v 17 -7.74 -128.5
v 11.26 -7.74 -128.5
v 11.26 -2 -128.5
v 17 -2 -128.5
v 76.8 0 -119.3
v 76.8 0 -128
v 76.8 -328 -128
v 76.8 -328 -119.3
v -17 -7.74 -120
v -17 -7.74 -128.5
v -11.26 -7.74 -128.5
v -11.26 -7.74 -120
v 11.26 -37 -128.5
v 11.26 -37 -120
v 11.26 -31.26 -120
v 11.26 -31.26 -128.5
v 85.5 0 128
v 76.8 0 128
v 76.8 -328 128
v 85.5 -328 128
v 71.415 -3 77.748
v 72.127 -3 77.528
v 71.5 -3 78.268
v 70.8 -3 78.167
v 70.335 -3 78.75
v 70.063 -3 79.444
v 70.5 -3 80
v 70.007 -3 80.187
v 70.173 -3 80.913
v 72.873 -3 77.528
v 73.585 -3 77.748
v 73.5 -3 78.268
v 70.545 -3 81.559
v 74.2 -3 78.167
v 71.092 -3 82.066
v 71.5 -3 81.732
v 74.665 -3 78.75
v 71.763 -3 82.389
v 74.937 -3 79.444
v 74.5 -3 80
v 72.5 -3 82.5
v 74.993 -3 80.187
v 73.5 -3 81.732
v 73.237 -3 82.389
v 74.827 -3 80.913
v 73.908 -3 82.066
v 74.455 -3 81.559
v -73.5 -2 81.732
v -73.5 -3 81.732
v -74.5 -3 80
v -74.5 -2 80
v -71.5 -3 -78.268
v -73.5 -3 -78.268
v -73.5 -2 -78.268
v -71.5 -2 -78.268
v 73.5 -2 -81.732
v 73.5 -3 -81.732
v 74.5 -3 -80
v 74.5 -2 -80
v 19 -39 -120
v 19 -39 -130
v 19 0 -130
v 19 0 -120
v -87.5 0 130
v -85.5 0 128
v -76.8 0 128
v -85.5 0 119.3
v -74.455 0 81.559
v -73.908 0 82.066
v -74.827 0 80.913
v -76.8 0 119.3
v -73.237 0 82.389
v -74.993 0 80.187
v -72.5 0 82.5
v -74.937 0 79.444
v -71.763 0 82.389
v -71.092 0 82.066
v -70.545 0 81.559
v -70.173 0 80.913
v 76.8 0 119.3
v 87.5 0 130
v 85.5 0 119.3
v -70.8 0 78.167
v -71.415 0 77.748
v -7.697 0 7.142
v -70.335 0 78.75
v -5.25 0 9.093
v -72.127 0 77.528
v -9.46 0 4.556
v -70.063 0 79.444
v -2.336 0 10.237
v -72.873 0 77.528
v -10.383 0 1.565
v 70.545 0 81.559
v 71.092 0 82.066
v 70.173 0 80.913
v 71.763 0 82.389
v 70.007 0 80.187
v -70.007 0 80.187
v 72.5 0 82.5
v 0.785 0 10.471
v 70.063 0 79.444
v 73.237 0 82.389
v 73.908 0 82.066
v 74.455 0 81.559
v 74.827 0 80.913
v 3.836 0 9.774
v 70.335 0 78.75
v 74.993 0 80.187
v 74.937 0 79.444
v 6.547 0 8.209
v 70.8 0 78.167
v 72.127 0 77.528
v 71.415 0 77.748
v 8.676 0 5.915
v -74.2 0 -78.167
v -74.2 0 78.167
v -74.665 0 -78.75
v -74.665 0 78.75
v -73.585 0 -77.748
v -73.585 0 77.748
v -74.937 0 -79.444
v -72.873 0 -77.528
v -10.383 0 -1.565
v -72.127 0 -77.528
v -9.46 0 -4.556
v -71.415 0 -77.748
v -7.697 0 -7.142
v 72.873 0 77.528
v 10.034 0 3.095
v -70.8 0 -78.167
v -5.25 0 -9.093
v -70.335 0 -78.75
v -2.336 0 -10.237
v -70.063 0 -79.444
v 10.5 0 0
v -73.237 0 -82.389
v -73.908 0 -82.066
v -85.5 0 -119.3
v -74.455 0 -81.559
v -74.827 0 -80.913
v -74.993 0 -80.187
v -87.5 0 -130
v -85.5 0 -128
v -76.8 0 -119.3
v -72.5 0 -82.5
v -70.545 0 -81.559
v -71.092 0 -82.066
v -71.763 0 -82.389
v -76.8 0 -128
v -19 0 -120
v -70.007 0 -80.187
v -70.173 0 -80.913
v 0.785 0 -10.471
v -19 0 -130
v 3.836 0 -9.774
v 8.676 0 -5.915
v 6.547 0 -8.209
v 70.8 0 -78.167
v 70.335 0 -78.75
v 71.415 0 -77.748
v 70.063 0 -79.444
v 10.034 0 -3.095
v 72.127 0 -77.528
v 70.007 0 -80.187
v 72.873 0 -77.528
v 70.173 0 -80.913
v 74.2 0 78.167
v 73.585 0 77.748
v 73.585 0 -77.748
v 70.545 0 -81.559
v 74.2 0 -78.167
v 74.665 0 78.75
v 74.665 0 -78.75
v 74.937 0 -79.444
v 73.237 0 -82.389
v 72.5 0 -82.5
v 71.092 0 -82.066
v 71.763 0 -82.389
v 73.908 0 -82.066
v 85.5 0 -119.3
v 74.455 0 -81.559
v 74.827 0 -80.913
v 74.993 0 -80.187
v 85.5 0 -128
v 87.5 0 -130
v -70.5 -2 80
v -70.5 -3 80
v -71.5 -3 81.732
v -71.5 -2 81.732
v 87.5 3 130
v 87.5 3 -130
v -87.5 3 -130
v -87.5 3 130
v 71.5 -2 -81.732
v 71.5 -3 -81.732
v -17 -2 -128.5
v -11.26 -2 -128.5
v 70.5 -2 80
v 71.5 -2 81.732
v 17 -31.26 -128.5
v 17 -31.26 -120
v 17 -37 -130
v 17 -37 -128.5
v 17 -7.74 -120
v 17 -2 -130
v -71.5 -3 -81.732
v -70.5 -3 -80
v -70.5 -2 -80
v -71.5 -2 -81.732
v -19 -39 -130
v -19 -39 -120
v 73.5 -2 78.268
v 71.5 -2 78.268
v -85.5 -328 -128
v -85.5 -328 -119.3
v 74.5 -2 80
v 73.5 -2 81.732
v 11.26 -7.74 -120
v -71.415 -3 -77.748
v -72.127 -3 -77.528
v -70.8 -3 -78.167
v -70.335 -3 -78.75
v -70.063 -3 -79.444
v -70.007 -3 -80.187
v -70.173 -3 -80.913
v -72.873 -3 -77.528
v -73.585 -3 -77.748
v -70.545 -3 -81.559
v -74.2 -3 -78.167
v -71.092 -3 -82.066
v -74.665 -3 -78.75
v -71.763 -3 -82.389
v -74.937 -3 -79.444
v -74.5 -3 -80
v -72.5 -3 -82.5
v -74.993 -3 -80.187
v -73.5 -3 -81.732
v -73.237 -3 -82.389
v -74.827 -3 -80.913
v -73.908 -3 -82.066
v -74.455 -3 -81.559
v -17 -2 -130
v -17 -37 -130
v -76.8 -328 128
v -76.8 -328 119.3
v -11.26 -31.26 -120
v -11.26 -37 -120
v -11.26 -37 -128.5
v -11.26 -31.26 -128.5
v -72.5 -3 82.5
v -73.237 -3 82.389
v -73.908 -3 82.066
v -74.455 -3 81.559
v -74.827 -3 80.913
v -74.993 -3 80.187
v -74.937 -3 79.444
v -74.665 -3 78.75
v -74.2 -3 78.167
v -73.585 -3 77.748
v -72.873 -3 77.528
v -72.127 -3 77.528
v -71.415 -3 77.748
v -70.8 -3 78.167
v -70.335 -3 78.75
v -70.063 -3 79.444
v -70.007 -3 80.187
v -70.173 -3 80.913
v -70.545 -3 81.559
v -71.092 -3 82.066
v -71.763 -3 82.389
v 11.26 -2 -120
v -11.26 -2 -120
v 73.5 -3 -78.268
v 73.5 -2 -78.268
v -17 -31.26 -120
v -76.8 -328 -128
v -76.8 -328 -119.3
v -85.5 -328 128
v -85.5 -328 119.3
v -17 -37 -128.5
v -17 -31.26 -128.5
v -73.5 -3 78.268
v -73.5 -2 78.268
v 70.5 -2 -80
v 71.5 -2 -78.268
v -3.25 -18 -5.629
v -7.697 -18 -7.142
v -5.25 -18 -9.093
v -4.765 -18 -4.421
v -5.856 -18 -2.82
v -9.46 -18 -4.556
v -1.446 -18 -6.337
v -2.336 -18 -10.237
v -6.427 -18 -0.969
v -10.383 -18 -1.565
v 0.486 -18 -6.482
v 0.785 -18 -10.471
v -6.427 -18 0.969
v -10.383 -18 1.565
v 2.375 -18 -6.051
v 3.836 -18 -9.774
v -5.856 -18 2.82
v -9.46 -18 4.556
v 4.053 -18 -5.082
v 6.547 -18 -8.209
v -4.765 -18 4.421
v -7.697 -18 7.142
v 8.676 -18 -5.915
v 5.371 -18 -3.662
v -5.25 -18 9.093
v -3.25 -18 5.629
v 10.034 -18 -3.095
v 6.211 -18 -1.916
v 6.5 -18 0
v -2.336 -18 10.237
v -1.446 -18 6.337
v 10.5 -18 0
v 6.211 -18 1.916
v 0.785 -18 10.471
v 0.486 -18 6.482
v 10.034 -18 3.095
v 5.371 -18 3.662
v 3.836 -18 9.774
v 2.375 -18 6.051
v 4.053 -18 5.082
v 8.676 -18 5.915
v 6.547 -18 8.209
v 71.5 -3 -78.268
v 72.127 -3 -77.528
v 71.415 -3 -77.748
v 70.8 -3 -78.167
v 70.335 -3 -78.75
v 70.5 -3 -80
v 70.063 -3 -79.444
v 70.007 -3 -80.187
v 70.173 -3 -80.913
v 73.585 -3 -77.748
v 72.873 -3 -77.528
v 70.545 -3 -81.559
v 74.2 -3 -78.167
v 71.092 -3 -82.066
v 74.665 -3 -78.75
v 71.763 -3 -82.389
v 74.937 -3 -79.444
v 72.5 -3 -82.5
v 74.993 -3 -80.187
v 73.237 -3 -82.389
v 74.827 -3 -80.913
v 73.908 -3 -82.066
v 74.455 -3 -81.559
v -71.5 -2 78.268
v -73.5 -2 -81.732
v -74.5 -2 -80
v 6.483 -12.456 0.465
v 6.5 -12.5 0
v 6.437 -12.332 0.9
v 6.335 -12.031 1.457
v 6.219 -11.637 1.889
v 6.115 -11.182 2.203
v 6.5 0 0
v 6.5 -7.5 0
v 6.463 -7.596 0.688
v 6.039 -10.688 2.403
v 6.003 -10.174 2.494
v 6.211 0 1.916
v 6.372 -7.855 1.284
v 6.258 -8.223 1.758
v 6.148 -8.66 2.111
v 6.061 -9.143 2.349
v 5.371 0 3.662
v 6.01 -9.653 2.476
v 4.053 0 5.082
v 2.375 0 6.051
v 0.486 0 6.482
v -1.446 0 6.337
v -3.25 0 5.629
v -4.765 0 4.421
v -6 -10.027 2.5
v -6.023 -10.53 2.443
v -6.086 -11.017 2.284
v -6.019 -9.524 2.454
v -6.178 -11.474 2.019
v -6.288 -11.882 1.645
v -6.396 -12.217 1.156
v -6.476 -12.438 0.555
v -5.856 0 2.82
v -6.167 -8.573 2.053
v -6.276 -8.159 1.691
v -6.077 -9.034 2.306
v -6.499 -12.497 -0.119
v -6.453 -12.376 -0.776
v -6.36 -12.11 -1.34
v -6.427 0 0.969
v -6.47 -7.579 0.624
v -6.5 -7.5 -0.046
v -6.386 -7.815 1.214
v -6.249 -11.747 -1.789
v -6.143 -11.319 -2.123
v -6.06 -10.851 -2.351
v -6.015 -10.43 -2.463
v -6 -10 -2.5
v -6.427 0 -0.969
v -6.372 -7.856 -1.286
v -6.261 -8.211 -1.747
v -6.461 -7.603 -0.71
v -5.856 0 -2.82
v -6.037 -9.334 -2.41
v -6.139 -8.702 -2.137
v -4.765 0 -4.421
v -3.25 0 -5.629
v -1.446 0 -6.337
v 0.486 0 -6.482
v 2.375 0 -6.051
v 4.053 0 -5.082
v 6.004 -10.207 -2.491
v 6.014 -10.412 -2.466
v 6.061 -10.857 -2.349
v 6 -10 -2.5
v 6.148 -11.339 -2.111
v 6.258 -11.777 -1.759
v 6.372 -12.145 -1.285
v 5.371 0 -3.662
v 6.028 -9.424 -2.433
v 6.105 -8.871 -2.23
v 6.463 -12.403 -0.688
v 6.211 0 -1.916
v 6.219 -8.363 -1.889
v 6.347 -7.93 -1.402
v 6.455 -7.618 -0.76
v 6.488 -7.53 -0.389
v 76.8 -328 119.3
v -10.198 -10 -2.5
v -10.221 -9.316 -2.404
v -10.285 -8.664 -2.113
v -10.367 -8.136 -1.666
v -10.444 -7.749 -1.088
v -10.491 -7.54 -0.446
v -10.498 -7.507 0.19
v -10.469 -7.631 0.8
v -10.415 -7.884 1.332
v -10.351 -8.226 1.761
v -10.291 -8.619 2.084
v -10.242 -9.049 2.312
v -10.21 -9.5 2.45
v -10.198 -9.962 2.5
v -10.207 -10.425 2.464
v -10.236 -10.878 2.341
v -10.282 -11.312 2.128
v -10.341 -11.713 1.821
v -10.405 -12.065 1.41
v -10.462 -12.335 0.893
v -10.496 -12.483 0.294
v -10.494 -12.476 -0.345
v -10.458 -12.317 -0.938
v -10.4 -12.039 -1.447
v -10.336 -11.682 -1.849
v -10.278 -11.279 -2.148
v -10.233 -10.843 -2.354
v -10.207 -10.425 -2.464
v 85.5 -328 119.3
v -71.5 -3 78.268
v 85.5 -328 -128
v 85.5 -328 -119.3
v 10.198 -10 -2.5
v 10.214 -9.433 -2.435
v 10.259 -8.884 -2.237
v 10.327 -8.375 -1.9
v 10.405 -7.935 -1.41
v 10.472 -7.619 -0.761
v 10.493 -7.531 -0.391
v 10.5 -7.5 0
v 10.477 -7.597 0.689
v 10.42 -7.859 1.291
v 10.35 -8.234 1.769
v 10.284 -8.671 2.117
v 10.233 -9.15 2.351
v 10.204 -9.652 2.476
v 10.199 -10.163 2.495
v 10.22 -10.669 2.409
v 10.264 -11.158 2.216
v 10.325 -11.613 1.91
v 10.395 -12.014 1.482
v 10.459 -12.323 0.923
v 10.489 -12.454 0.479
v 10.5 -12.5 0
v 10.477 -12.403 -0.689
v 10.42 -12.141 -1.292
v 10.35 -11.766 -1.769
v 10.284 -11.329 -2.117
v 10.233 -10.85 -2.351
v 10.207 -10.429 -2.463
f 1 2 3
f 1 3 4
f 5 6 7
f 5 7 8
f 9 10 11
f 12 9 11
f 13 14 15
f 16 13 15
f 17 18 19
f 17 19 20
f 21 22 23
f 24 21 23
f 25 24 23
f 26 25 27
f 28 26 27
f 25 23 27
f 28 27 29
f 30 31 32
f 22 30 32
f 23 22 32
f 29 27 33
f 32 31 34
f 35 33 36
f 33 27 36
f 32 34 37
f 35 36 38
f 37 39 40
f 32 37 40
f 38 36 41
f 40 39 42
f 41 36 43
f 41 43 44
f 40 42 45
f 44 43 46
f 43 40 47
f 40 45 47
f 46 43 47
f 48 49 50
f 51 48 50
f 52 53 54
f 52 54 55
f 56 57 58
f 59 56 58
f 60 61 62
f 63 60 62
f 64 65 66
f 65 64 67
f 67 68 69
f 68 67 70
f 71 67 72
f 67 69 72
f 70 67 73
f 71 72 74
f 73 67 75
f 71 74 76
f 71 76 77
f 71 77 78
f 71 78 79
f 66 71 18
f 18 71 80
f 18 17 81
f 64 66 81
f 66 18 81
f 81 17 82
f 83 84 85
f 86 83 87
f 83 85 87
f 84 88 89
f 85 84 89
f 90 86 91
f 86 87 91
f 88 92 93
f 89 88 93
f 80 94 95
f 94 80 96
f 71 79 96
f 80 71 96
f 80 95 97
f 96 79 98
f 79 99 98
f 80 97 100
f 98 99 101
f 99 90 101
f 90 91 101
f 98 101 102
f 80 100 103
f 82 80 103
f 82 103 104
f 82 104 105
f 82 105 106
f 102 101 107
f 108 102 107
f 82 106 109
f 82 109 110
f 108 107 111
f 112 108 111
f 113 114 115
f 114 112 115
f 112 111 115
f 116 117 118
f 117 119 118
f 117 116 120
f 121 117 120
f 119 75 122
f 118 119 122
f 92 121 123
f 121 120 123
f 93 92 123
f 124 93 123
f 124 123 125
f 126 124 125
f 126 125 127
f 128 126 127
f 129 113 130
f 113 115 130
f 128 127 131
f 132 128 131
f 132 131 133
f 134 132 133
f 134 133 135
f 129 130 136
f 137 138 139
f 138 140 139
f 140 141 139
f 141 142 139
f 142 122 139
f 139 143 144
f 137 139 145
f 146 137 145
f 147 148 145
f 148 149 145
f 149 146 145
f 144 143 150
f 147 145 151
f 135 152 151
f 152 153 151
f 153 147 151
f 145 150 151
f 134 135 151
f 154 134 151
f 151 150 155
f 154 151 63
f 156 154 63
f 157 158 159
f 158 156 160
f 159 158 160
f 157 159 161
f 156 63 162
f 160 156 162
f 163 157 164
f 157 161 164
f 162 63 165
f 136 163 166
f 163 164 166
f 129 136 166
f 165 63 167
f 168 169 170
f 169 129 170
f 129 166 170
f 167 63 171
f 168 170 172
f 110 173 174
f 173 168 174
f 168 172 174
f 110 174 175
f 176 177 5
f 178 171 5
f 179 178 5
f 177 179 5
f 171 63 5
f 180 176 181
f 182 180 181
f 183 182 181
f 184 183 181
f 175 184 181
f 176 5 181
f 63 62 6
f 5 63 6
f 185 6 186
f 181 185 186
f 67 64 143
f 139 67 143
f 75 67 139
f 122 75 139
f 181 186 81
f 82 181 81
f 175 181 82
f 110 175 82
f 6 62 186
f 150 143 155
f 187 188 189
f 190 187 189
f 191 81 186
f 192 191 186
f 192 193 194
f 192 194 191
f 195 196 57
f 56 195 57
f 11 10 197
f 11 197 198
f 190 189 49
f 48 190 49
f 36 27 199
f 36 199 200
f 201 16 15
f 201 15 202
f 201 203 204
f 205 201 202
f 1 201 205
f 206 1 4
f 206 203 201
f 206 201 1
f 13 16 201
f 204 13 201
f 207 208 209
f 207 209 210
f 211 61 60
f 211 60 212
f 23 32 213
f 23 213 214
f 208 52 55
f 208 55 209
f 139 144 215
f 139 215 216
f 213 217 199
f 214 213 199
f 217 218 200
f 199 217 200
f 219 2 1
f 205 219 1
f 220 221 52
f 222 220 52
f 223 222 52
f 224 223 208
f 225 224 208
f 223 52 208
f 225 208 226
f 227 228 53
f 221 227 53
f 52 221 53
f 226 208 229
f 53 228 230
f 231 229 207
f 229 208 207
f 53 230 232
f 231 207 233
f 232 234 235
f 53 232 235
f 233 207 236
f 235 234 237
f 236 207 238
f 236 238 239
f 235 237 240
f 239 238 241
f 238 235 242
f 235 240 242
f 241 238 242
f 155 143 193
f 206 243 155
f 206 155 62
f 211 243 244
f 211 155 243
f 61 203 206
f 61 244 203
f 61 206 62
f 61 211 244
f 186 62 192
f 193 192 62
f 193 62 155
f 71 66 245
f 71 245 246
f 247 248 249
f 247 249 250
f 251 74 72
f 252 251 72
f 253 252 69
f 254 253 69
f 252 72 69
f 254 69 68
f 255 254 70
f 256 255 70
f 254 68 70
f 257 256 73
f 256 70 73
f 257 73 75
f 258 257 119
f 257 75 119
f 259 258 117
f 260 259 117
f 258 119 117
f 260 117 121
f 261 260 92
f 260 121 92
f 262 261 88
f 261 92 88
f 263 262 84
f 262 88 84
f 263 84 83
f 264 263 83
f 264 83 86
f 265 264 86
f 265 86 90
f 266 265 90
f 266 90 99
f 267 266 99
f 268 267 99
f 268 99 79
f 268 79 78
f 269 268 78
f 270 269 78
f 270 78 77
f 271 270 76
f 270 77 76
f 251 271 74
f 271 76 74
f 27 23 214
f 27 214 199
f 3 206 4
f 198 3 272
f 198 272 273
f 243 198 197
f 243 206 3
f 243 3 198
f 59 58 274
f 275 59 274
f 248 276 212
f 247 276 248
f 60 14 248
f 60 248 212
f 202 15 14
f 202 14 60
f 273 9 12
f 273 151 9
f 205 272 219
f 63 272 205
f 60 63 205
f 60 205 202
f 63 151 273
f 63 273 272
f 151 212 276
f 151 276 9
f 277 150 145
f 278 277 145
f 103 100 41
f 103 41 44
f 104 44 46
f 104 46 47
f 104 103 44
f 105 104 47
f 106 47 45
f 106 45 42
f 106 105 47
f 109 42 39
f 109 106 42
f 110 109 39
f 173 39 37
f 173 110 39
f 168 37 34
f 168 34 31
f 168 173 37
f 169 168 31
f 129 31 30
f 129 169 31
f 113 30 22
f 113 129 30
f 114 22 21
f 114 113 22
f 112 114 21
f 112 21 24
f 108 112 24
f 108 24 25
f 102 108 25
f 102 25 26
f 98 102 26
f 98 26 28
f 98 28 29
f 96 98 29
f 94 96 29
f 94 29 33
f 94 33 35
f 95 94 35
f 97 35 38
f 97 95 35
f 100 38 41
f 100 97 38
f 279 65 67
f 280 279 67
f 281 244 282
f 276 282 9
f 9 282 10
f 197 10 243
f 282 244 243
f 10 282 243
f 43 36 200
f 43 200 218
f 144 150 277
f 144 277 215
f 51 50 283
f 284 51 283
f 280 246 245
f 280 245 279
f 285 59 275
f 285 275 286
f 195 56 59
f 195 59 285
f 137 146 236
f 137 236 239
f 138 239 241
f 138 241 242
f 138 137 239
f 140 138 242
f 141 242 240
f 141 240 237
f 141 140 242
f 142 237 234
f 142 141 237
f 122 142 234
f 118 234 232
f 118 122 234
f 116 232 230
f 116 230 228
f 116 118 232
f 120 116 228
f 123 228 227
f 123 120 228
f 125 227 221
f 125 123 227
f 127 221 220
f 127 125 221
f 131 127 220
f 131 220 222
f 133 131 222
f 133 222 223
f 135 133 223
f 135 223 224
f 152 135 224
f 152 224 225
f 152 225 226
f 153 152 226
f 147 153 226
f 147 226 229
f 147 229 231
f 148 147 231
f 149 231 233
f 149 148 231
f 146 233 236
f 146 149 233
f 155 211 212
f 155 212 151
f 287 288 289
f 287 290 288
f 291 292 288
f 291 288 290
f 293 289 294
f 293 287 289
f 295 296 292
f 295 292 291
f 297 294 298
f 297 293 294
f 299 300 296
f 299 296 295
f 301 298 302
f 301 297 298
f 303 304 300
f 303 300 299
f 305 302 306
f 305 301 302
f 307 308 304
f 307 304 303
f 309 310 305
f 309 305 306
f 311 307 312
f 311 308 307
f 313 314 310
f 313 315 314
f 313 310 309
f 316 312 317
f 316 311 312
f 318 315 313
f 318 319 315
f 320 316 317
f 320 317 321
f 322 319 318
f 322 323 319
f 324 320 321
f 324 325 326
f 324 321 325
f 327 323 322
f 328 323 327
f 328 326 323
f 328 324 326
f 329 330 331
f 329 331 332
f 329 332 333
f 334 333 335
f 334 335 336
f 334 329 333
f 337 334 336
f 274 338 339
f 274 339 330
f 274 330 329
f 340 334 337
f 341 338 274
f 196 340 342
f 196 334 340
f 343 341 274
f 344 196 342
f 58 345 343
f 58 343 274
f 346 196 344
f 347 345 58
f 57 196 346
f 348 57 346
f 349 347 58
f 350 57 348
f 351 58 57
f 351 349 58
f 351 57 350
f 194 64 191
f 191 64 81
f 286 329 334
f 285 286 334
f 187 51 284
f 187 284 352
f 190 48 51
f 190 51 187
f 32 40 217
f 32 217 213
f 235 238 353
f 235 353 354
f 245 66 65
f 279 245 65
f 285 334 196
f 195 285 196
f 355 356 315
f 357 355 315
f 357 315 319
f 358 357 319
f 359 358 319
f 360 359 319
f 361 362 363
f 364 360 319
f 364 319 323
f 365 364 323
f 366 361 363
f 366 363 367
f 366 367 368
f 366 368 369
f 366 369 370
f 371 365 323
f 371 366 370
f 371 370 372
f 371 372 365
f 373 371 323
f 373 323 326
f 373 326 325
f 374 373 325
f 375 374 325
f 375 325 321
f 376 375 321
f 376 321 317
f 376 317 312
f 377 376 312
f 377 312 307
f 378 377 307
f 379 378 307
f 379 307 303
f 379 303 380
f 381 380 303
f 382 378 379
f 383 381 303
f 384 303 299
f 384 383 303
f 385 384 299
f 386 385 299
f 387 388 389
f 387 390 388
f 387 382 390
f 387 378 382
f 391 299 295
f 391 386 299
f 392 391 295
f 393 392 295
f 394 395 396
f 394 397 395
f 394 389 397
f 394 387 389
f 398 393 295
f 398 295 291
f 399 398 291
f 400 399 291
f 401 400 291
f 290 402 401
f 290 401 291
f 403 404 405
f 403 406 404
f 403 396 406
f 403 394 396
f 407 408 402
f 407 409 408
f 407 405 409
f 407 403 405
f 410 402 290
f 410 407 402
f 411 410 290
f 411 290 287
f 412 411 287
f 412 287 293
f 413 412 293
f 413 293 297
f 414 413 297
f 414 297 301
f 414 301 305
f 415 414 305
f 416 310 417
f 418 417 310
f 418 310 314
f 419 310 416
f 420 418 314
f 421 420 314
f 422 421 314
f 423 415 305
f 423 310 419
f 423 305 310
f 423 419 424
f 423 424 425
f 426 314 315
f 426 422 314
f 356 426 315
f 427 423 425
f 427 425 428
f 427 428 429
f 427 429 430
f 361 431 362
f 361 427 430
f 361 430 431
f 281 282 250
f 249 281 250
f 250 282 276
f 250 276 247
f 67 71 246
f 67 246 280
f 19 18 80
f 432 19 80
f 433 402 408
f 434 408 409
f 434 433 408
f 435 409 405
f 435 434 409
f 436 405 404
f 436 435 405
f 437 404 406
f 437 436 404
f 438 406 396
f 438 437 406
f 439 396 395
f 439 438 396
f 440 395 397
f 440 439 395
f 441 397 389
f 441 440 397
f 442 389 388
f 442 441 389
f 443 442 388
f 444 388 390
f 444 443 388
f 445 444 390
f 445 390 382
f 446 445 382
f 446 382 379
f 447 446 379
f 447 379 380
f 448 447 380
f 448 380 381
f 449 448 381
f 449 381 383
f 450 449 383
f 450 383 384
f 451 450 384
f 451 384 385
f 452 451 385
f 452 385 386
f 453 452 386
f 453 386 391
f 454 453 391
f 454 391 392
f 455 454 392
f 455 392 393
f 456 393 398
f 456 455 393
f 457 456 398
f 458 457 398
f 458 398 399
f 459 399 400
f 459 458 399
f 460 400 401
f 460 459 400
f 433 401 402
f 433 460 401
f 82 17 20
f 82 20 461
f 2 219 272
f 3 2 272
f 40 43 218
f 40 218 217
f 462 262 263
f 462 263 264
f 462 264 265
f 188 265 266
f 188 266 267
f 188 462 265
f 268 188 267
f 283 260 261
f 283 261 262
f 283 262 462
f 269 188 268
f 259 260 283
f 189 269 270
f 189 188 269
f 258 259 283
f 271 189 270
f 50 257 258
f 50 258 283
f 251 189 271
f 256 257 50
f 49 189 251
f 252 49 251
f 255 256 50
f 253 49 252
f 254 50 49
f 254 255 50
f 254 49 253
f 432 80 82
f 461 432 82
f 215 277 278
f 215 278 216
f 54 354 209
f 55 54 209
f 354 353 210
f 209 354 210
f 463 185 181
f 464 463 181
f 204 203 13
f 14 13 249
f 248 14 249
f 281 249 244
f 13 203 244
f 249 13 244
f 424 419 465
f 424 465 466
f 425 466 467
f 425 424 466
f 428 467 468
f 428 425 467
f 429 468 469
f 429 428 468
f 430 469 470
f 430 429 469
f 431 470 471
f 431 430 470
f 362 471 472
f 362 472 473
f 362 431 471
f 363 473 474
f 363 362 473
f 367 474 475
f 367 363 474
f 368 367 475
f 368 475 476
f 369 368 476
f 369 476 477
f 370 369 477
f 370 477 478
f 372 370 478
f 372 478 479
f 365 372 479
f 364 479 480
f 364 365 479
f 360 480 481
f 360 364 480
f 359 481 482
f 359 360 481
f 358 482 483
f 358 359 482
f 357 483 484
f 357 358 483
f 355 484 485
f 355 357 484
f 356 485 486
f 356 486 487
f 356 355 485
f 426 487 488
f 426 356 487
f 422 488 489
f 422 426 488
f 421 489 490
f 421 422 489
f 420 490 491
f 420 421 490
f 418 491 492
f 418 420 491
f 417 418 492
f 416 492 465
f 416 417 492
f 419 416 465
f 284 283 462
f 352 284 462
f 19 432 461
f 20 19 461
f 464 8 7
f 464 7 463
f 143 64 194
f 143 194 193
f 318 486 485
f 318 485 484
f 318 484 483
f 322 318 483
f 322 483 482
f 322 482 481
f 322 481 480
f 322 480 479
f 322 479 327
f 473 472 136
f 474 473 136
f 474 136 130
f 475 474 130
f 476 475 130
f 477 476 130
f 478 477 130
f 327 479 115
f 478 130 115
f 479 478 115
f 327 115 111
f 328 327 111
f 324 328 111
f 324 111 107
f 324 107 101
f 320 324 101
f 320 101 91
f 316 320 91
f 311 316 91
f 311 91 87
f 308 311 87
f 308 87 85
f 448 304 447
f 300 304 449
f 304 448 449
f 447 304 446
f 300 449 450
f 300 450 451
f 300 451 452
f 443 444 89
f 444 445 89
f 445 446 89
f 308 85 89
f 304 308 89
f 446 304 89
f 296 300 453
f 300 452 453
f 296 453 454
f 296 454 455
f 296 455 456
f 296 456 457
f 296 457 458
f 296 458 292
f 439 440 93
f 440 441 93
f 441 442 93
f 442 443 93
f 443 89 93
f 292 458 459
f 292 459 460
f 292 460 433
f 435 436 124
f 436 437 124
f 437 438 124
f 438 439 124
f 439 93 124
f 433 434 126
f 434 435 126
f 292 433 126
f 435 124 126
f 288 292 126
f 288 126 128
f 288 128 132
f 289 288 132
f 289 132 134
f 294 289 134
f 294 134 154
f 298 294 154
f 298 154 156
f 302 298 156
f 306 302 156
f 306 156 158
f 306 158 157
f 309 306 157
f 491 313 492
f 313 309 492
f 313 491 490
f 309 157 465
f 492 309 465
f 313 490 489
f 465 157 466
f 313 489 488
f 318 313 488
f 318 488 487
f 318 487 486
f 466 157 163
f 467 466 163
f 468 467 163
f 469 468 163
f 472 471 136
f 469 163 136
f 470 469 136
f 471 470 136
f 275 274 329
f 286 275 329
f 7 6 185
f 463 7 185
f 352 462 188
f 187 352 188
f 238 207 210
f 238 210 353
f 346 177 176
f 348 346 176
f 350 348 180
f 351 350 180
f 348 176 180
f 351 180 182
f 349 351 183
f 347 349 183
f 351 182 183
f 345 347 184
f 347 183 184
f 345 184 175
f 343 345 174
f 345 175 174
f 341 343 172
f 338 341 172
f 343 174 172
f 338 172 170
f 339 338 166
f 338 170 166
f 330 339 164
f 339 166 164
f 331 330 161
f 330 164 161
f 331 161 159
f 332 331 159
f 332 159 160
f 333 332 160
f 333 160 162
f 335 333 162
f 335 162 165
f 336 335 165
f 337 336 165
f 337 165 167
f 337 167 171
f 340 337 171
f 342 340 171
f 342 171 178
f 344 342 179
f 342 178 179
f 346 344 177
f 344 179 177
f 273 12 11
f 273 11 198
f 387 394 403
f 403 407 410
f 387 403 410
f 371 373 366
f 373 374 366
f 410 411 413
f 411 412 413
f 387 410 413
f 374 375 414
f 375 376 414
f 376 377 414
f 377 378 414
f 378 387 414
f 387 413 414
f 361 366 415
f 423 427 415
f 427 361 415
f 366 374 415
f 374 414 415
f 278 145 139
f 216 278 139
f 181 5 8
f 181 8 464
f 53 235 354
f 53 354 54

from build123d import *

# Parameters (mm, degrees)
SKETCH1_W               = 175
SKETCH1_H               = 260
BOSS_EXTRUDE1_DEPTH     = 3
SKETCH4_W               = 8.7
SKETCH4_H               = 8.7
BOSS_EXTRUDE3_DEPTH     = 328
MIRROR5_COPY_1_SKETCH_W = 8.7
MIRROR5_COPY_1_SKETCH_H = 8.7
MIRROR5_COPY_1_DEPTH    = 328
SKETCH6_W               = 38
SKETCH6_H               = 39
SKETCH6_W_2             = 34
SKETCH6_H_2             = 35
EXTRUDE_THIN1_DEPTH     = 10
SKETCH7_W               = 5.74
SKETCH7_H               = 5.74
BOSS_EXTRUDE5_DEPTH     = 8.5
SKETCH9_R               = 10.5
SKETCH9_R_2             = 6.5
EXTRUDE_THIN2_DEPTH     = 18
CUT_EXTRUDE1_DEPTH      = 367.180283467
CUT_EXTRUDE1_DEPTH_BACK = 367.180283467
SKETCH10_R              = 2.5
SKETCH11_R              = 2.5
BOSS_EXTRUDE6_DEPTH     = 3
CUT_EXTRUDE2_DEPTH      = 1
MIRROR7_COPY_1_SKETCH_R = 2.5
MIRROR7_COPY_1_DEPTH    = 3
MIRROR7_COPY_2_DEPTH    = 1


with BuildPart() as part:
    # Sketch1 → Boss-Extrude1 (new body)
    with BuildSketch(Plane(origin=(0, 0, 0), x_dir=(1, 0, 0), z_dir=(0, 1, 0))):
        Rectangle(SKETCH1_W, SKETCH1_H)
    extrude(amount=BOSS_EXTRUDE1_DEPTH)

    # Sketch4 → Boss-Extrude3 (add)
    with BuildSketch(Plane.XZ):
        with Locations((81.15, -123.65)):
            Rectangle(SKETCH4_W, SKETCH4_H)
    boss_extrude3 = extrude(amount=BOSS_EXTRUDE3_DEPTH)

    # Mirror3: Boss-Extrude3 across plane
    add(boss_extrude3.mirror(Plane.XY))

    # Mirror5: Boss-Extrude3 across plane
    add(boss_extrude3.mirror(Plane(origin=(0, 0, 0), x_dir=(0, 0, 1), z_dir=(1, 0, 0))))

    # Mirror5 copy 1 sketch → Mirror5 copy 1 (add)
    with BuildSketch(Plane(origin=(0, 0, 0), x_dir=(-1, 0, 0), z_dir=(0, -1, 0))):
        with Locations((81.15, -123.65)):
            Rectangle(MIRROR5_COPY_1_SKETCH_W, MIRROR5_COPY_1_SKETCH_H)
    extrude(amount=MIRROR5_COPY_1_DEPTH)

    # Sketch6 → Extrude-Thin1 (add)
    with BuildSketch(Plane(origin=(0, 0, -130), x_dir=(-1, 0, 0), z_dir=(0, 0, -1))):
        with Locations((0, -19.5)):
            Rectangle(SKETCH6_W, SKETCH6_H)
        with Locations((0, -19.5)):
            Rectangle(SKETCH6_W_2, SKETCH6_H_2, mode=Mode.SUBTRACT)
    extrude(amount=-EXTRUDE_THIN1_DEPTH)

    # Sketch7 → Boss-Extrude5 (add)
    with BuildSketch(Plane.XY.offset(-120)):
        with Locations((14.13, -4.87)):
            Rectangle(SKETCH7_W, SKETCH7_H)
        with Locations((-14.13, -4.87)):
            Rectangle(SKETCH7_W, SKETCH7_H)
        with Locations((-14.13, -34.13)):
            Rectangle(SKETCH7_W, SKETCH7_H)
        with Locations((14.13, -34.13)):
            Rectangle(SKETCH7_W, SKETCH7_H)
    extrude(amount=-BOSS_EXTRUDE5_DEPTH)

    # Sketch9 → Extrude-Thin2 (add)
    with BuildSketch(Plane.XZ):
        Circle(SKETCH9_R)
        Circle(SKETCH9_R_2, mode=Mode.SUBTRACT)
    extrude(amount=EXTRUDE_THIN2_DEPTH)

    # Sketch10 → Cut-Extrude1 (cut, two sides: drawn at the far end of the back side and taken through both)
    with BuildSketch(Plane(origin=(10.5, 0, 0), x_dir=(0, 0, -1), z_dir=(1, 0, 0)).offset(-CUT_EXTRUDE1_DEPTH_BACK)):
        with Locations((0, -10)):
            Circle(SKETCH10_R)
    extrude(amount=CUT_EXTRUDE1_DEPTH + CUT_EXTRUDE1_DEPTH_BACK, mode=Mode.SUBTRACT)

    # Sketch11 → Boss-Extrude6 (add)
    with BuildSketch(Plane.XZ):
        with Locations(Location((-72.5, 80, 0), (0, 0, 90))):
            Circle(SKETCH11_R)
    boss_extrude6 = extrude(amount=BOSS_EXTRUDE6_DEPTH)

    # Sketch12 → Cut-Extrude2 (cut)
    with BuildSketch(Plane.XZ.offset(3)):
        Polygon((-70.5, 80), (-71.5, 81.732050808), (-73.5, 81.732050808), (-74.5, 80), (-73.5, 78.267949192), (-71.5, 78.267949192), align=None)
    cut_extrude2 = extrude(amount=-CUT_EXTRUDE2_DEPTH, mode=Mode.SUBTRACT)

    # Mirror6: Boss-Extrude6, Cut-Extrude2 across plane
    add(boss_extrude6.mirror(Plane(origin=(0, 0, 0), x_dir=(0, 0, 1), z_dir=(1, 0, 0))))
    add(cut_extrude2.mirror(Plane(origin=(0, 0, 0), x_dir=(0, 0, 1), z_dir=(1, 0, 0))), mode=Mode.SUBTRACT)

    # Mirror7: Boss-Extrude6, Cut-Extrude2 across plane
    add(boss_extrude6.mirror(Plane.XY))
    add(cut_extrude2.mirror(Plane.XY), mode=Mode.SUBTRACT)

    # Mirror7 copy 1 sketch → Mirror7 copy 1 (add)
    with BuildSketch(Plane(origin=(0, 0, 0), x_dir=(-1, 0, 0), z_dir=(0, -1, 0))):
        with Locations(Location((-72.5, 80, 0), (0, 0, 90))):
            Circle(MIRROR7_COPY_1_SKETCH_R)
    extrude(amount=MIRROR7_COPY_1_DEPTH)

    # Mirror7 copy 2 sketch → Mirror7 copy 2 (cut)
    with BuildSketch(Plane(origin=(0, -3, 0), x_dir=(-1, 0, 0), z_dir=(0, -1, 0))):
        Polygon((-70.5, 80), (-71.5, 81.732050808), (-73.5, 81.732050808), (-74.5, 80), (-73.5, 78.267949192), (-71.5, 78.267949192), align=None)
    extrude(amount=-MIRROR7_COPY_2_DEPTH, mode=Mode.SUBTRACT)


solid = part.part
